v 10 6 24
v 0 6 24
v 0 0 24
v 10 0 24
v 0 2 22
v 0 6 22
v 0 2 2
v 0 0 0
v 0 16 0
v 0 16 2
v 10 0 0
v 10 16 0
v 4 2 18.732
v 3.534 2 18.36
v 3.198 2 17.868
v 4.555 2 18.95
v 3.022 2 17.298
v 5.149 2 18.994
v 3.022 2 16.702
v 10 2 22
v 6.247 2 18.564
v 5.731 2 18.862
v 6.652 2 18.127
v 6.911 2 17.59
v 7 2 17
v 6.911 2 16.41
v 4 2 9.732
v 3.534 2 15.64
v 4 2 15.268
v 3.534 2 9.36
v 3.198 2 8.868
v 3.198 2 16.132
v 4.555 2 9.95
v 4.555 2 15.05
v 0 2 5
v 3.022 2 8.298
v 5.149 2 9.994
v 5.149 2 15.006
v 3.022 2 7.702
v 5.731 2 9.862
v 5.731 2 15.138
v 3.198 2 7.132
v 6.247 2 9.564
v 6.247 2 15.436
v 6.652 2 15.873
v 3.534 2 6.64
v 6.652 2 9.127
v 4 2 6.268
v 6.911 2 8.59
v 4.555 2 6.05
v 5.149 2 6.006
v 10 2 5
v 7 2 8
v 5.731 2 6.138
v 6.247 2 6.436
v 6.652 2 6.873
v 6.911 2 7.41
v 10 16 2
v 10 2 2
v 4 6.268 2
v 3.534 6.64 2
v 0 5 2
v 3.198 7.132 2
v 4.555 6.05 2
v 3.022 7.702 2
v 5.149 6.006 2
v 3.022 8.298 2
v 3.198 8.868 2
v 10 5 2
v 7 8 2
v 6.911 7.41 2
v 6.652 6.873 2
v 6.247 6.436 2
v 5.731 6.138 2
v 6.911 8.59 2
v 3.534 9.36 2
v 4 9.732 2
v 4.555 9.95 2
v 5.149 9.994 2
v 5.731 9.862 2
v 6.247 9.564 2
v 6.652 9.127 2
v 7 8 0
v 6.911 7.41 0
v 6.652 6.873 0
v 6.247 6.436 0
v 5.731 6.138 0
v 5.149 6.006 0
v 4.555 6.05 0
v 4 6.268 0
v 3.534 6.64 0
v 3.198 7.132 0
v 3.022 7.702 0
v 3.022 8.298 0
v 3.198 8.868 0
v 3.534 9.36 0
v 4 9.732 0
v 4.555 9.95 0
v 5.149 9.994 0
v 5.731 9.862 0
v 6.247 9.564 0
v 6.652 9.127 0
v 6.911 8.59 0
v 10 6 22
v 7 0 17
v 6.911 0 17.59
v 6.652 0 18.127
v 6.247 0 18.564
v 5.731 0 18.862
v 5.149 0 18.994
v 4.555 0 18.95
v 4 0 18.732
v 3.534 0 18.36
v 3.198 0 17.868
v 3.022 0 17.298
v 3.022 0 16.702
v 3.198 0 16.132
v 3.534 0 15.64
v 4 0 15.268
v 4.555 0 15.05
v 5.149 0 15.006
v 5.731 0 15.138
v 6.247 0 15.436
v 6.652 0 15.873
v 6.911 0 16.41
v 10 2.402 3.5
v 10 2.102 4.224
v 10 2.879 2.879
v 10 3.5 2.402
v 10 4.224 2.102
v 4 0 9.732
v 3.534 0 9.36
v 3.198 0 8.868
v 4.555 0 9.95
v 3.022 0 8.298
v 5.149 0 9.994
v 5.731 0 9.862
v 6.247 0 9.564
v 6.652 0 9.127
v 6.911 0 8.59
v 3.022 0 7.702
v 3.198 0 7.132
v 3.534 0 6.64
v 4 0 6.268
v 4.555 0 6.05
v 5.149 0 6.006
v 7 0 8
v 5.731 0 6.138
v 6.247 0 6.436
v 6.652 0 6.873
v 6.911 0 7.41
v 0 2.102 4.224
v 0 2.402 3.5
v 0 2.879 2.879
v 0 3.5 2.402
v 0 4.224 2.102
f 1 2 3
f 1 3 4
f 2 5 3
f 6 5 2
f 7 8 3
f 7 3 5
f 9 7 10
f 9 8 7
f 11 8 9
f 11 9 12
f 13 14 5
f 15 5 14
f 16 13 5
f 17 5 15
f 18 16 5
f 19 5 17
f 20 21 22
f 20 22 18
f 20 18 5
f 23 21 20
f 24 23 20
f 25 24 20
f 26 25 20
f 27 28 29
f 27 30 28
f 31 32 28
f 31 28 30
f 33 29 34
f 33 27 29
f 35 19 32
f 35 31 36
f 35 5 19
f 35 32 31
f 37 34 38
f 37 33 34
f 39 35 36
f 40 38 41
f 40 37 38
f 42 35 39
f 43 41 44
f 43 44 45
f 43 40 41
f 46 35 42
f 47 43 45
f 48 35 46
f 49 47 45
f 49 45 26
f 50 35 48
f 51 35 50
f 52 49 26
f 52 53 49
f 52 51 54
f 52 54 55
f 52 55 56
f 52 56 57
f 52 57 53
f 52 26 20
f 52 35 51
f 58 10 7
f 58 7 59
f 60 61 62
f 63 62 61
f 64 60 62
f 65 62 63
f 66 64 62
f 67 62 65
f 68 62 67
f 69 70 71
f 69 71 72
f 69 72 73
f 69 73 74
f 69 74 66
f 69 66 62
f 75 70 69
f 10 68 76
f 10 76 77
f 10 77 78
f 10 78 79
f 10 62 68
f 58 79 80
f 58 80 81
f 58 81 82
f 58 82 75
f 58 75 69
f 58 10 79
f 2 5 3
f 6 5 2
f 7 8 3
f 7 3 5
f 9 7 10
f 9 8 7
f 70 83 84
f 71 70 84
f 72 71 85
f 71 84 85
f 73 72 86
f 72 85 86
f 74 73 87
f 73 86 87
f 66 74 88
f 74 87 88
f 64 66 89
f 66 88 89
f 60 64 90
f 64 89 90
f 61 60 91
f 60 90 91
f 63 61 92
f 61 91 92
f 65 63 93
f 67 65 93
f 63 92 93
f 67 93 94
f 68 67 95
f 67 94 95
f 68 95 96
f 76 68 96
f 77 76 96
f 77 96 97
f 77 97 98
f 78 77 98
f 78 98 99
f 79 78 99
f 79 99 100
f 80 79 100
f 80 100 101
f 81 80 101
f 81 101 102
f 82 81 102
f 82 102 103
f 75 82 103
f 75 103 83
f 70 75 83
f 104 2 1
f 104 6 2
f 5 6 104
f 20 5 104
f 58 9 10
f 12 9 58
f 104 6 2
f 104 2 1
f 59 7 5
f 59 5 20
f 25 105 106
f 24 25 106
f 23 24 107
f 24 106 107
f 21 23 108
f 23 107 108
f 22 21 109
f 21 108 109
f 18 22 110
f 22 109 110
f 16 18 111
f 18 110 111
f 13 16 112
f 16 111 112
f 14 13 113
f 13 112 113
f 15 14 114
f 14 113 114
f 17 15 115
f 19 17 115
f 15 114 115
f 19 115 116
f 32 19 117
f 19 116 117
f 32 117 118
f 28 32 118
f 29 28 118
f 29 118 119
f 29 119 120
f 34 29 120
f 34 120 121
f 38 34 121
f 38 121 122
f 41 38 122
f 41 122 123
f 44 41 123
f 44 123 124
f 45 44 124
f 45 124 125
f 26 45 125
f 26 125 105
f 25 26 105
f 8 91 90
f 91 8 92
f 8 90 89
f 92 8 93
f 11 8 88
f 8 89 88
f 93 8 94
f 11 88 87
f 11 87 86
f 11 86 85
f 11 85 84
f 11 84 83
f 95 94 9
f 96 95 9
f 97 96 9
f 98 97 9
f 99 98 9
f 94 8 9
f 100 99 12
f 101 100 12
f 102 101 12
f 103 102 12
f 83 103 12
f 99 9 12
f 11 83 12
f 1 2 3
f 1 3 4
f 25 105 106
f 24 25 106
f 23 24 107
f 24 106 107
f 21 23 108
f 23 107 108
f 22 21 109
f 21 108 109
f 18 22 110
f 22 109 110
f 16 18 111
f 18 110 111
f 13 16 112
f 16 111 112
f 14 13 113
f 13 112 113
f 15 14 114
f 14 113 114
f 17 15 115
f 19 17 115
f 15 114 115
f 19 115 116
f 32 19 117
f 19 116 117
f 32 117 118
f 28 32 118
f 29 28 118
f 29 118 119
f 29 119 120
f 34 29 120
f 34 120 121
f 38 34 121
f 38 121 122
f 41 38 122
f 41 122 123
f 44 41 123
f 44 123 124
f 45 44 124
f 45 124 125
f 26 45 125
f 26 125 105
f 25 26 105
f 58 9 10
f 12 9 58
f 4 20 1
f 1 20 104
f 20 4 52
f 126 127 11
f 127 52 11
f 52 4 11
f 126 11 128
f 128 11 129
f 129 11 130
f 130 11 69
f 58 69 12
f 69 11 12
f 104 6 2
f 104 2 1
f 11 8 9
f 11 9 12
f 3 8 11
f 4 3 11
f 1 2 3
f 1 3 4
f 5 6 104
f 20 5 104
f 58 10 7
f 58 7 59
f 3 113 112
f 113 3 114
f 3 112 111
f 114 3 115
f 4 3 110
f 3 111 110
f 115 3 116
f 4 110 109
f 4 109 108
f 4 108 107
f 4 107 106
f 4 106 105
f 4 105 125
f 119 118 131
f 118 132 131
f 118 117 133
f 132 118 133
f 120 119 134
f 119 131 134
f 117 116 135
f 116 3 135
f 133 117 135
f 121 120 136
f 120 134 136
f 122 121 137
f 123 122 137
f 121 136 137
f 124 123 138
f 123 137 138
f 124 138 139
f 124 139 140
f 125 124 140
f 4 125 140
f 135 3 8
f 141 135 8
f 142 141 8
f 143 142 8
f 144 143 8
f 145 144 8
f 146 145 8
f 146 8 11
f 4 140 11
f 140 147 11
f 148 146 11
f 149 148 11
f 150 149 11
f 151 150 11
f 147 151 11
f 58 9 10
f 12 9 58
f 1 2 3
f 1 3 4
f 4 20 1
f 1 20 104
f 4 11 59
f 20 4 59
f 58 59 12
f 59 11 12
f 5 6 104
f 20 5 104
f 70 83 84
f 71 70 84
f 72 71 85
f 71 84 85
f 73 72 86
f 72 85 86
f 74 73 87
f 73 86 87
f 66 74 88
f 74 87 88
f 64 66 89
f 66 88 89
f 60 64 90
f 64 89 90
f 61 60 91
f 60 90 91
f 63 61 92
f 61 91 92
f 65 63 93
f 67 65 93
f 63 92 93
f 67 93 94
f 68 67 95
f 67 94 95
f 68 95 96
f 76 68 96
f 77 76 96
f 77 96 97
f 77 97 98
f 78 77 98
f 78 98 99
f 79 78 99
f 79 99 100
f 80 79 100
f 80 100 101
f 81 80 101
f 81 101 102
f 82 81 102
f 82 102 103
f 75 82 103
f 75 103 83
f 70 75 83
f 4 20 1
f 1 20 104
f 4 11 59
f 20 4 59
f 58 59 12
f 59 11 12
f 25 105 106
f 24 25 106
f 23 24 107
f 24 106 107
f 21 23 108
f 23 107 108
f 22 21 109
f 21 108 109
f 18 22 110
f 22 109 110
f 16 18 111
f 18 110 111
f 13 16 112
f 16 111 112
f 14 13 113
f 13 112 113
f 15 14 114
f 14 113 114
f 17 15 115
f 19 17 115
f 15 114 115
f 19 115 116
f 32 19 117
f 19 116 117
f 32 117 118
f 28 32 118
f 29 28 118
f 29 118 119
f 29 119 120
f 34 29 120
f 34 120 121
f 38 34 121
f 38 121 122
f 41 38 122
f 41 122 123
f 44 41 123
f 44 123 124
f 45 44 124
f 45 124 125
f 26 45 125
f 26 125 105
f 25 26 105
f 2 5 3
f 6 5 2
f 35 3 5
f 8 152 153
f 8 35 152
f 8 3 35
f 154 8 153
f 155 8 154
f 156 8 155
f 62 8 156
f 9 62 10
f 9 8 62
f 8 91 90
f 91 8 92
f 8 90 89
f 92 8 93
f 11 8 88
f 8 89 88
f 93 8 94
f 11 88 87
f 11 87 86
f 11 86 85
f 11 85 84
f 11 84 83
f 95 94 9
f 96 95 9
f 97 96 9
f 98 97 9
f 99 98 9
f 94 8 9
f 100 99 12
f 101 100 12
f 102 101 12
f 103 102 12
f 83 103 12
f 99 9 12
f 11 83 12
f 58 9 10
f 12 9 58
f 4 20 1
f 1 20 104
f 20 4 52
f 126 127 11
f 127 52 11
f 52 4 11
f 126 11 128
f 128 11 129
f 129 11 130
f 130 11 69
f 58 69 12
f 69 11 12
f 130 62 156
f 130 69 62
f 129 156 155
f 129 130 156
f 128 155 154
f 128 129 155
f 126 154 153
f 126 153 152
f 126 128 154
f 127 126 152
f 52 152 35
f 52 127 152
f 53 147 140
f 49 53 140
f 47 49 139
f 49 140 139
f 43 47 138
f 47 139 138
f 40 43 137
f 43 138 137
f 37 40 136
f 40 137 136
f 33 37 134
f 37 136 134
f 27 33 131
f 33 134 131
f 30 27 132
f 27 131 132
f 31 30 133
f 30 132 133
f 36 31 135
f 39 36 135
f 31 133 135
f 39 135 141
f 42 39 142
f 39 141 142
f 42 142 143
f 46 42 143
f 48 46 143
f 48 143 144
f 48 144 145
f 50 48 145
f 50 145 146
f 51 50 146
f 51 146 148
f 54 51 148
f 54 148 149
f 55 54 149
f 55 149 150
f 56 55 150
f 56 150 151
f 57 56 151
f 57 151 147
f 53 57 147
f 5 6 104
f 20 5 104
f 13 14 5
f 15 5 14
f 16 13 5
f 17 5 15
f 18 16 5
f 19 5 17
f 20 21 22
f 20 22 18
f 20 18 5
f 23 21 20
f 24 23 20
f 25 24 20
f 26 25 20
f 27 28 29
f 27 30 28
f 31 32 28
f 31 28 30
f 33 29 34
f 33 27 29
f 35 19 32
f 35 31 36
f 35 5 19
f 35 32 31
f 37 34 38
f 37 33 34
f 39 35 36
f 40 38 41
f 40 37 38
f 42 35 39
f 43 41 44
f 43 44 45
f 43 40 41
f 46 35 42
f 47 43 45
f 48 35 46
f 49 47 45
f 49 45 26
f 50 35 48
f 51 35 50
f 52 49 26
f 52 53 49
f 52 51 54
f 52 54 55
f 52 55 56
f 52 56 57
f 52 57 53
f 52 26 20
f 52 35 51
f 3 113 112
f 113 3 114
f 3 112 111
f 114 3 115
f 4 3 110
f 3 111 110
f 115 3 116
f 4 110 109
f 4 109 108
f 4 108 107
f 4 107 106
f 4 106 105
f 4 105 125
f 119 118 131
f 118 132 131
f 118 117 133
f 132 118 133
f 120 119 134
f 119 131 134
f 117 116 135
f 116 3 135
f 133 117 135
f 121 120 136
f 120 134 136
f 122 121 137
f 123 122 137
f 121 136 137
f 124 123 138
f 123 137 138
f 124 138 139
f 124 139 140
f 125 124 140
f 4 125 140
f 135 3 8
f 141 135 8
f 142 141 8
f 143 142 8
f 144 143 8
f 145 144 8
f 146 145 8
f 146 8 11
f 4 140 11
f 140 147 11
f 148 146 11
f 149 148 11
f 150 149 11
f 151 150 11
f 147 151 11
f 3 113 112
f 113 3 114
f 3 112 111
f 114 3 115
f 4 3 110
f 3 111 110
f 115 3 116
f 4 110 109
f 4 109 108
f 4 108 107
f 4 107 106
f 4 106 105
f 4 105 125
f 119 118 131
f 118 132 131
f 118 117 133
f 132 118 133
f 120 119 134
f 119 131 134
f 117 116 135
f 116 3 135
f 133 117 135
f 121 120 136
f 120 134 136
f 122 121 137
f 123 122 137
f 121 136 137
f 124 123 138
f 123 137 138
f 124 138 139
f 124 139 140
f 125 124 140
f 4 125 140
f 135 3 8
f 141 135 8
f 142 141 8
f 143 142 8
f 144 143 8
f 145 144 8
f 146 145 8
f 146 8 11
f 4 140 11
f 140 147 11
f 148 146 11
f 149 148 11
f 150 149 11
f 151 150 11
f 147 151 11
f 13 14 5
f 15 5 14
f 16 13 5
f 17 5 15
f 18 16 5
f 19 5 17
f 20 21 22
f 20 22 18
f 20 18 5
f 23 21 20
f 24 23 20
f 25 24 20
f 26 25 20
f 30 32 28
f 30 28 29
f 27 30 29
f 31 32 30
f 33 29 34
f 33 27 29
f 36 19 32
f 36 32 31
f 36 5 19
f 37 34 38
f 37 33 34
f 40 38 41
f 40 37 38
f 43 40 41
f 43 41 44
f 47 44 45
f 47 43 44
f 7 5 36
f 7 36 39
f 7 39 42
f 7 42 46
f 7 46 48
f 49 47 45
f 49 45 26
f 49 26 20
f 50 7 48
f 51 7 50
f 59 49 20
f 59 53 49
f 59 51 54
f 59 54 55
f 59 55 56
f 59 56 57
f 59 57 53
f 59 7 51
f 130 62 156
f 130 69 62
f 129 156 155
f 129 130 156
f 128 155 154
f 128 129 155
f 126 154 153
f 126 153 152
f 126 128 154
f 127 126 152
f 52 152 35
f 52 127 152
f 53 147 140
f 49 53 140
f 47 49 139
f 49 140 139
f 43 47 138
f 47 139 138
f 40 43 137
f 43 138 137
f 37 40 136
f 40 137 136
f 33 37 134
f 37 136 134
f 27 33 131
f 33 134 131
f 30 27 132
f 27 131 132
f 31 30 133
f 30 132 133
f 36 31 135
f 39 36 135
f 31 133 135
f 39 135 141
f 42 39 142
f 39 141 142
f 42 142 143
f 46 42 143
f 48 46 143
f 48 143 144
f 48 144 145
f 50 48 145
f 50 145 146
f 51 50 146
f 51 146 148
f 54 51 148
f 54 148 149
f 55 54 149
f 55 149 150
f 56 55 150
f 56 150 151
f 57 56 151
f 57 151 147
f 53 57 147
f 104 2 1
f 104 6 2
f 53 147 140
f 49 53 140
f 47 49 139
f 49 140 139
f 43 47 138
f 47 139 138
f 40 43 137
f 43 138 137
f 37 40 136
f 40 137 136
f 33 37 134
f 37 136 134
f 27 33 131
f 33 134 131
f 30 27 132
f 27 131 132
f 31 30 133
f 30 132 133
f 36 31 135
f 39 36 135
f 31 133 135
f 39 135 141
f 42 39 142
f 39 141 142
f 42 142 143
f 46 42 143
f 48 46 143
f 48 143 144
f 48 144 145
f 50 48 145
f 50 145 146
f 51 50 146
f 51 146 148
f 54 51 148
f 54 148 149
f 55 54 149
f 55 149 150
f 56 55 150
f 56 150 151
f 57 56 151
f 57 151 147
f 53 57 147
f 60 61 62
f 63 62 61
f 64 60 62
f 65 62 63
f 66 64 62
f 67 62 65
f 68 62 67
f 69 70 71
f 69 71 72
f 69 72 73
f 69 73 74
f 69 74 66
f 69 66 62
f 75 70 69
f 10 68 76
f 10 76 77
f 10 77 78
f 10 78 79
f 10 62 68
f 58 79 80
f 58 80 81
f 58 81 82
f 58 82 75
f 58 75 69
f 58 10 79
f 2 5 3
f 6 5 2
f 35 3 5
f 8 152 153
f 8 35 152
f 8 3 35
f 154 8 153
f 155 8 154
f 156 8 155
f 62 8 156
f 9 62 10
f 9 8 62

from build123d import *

# Parameters (mm, degrees)
BOX002_W        = 10
BOX002_H        = 10
BOX002_DEPTH    = 22
BOX001_W        = 10
BOX001_H        = 14
BOX001_DEPTH    = 20
BOX_W           = 10
BOX_H           = 16
BOX_DEPTH       = 24
SKETCH_R        = 2
POCKET_DEPTH    = 16.001
SKETCH001_R     = 2
POCKET001_DEPTH = 24.001
FILLET_R        = 3
POCKET002_DEPTH = 16.001
FILLET001_R     = 3


with BuildPart() as cubo002:
    # Box002 → Box002 (new body)
    with BuildSketch(Plane(origin=(0, 6, 2), x_dir=(1, 0, 0), z_dir=(0, 0, 1))):
        with Locations((5, 5)):
            Rectangle(BOX002_W, BOX002_H)
    extrude(amount=BOX002_DEPTH)


with BuildPart() as cubo001:
    # Box001 → Box001 (new body)
    with BuildSketch(Plane(origin=(0, 2, 2), x_dir=(1, 0, 0), z_dir=(0, 0, 1))):
        with Locations((5, 7)):
            Rectangle(BOX001_W, BOX001_H)
    extrude(amount=BOX001_DEPTH)


with BuildPart() as cut:
    # Box → Box (new body)
    with BuildSketch(Plane.XY):
        with Locations((5, 8)):
            Rectangle(BOX_W, BOX_H)
    extrude(amount=BOX_DEPTH)

    # Cut: cut Cubo001
    add(cubo001.part, mode=Mode.SUBTRACT)


with BuildPart() as cut001:
    # Cut001 base: copy of Cut
    add(cut.part)

    # Cut001: cut Cubo002
    add(cubo002.part, mode=Mode.SUBTRACT)


with BuildPart() as pocket001:
    # Pocket base: copy of Cut001
    add(cut001.part)

    # Sketch → Pocket (cut, through all)
    with BuildSketch(Plane.XZ):
        with Locations((5, 8)):
            Circle(SKETCH_R)
        with Locations((5, 17)):
            Circle(SKETCH_R)
    extrude(amount=-POCKET_DEPTH, mode=Mode.SUBTRACT)

    # Sketch001 → Pocket001 (cut, through all)
    with BuildSketch(Plane(origin=(0, 0, 0), x_dir=(1, 0, 0), z_dir=(0, 0, -1))):
        with Locations((5, -8)):
            Circle(SKETCH001_R)
    extrude(amount=-POCKET001_DEPTH, mode=Mode.SUBTRACT)


with BuildPart() as fillet_body:
    # Fillet base: copy of Pocket001
    add(pocket001.part)

    # Fillet
    fillet_edges = [fillet_body.edges().sort_by_distance(p)[0] for p in [
        (5, 2, 2),
    ]]
    fillet(fillet_edges, radius=FILLET_R)


with BuildPart() as cut002:
    # Cut002 base: copy of Cut
    add(cut.part)

    # Cut002: cut Cubo002
    add(cubo002.part, mode=Mode.SUBTRACT)


with BuildPart() as pocket002:
    # Pocket002 base: copy of Cut001
    add(cut001.part)

    # Sketch → Pocket002 (cut, through all)
    with BuildSketch(Plane.XZ):
        with Locations((5, 8)):
            Circle(SKETCH_R)
        with Locations((5, 17)):
            Circle(SKETCH_R)
    extrude(amount=-POCKET002_DEPTH, mode=Mode.SUBTRACT)


with BuildPart() as fillet001:
    # Fillet001 base: copy of Pocket001
    add(pocket001.part)

    # Fillet001
    fillet001_edges = [fillet001.edges().sort_by_distance(p)[0] for p in [
        (5, 2, 2),
    ]]
    fillet(fillet001_edges, radius=FILLET001_R)


solid = Compound([fillet_body.part, cut002.part, pocket002.part, fillet001.part])
